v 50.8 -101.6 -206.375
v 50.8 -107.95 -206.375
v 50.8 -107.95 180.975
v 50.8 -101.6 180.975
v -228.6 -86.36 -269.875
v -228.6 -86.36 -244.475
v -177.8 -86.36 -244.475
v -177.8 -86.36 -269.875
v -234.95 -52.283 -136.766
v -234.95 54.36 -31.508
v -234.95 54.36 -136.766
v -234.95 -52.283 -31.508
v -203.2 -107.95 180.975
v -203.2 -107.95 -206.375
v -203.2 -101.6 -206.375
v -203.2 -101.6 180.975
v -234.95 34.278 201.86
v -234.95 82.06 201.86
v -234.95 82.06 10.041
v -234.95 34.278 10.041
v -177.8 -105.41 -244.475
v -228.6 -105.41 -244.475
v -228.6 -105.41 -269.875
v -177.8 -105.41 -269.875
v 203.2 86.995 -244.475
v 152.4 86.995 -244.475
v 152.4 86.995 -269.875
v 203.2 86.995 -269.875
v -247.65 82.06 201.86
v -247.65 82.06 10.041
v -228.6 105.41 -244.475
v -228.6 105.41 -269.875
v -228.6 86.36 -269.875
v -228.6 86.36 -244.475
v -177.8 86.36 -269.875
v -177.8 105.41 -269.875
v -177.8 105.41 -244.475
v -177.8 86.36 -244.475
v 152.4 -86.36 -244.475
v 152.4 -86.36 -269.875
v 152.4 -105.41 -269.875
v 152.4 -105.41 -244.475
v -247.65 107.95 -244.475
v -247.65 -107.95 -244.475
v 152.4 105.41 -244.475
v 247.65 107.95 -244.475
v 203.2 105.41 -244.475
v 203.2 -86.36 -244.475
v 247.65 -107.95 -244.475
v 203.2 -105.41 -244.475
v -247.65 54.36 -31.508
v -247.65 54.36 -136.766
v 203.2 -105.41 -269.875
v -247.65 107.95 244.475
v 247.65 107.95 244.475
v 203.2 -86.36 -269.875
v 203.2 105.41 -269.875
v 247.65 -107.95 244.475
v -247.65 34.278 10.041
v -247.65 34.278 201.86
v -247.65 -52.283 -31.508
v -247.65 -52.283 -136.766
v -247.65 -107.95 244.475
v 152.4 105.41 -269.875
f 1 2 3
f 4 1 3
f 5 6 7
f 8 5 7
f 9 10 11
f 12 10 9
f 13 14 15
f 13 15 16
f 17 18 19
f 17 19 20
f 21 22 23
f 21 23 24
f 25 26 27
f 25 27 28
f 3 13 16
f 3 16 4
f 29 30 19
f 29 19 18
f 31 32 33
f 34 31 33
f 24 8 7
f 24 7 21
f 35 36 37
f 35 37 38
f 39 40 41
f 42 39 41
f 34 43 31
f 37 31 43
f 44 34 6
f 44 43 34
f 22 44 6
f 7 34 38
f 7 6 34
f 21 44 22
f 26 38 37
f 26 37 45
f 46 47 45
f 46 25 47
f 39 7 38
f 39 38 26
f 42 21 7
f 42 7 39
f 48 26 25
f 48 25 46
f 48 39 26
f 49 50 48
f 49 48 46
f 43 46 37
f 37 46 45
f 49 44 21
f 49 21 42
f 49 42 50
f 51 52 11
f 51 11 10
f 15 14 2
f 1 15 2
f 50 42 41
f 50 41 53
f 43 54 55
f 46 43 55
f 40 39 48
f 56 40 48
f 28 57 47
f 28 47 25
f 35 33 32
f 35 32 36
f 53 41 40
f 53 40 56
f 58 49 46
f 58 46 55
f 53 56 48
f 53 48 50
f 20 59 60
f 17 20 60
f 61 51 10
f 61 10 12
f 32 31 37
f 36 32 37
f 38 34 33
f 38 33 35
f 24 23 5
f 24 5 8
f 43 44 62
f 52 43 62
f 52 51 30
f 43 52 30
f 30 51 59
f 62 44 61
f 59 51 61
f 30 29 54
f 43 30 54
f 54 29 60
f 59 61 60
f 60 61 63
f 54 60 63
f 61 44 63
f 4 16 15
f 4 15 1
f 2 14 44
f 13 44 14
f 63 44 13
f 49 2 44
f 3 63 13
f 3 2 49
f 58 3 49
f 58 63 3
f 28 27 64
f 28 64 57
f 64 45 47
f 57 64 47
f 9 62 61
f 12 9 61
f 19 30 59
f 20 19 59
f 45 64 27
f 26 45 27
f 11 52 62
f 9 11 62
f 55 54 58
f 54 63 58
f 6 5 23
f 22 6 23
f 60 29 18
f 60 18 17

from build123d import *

# Parameters (mm, degrees)
F0_W     = 495.3
F0_H     = 488.95
F1_DEPTH = 107.95
F2_W     = 254
F2_H     = 387.35
F3_DEPTH = 6.35
F4_W     = 50.8
F4_H     = 19.05
F4_H_2   = 18.415
F5_DEPTH = 25.4
F6_W     = 106.6431775689
F6_H     = 105.2582077682
F6_W_2   = 47.7816872299
F6_H_2   = 191.8192440644
F7_DEPTH = 12.7


with BuildPart() as f1:
    # F0 (on Front) → F1 (new body, symmetric)
    with BuildSketch(Plane.XZ):
        Rectangle(F0_W, F0_H)
    extrude(amount=F1_DEPTH, both=True)

    # F2 (on face) → F3 (cut)
    with BuildSketch(Plane.XZ.offset(107.95)):
        with Locations((-76.2, -12.7)):
            Rectangle(F2_W, F2_H)
    extrude(amount=-F3_DEPTH, mode=Mode.SUBTRACT)

    # F4 (on face) → F5 (join)
    with BuildSketch(Plane(origin=(0, 0, -244.475), x_dir=(1, 0, 0), z_dir=(0, 0, -1))):
        with Locations((-203.2, 95.885)):
            Rectangle(F4_W, F4_H)
        with Locations((177.8, 95.885)):
            Rectangle(F4_W, F4_H)
        with Locations((177.8, -96.2025)):
            Rectangle(F4_W, F4_H_2)
        with Locations((-203.2, -95.885)):
            Rectangle(F4_W, F4_H)
    extrude(amount=F5_DEPTH)

    # F6 (on face) → F7 (cut)
    with BuildSketch(Plane(origin=(-247.65, 0, 0), x_dir=(0, -1, 0), z_dir=(-1, 0, 0))):
        with Locations((-1.0387524962, -84.1373149306)):
            Rectangle(F6_W, F6_H)
        with Locations((-58.1690315157, 105.9507015161)):
            Rectangle(F6_W_2, F6_H_2)
    extrude(amount=-F7_DEPTH, mode=Mode.SUBTRACT)


solid = f1.part
